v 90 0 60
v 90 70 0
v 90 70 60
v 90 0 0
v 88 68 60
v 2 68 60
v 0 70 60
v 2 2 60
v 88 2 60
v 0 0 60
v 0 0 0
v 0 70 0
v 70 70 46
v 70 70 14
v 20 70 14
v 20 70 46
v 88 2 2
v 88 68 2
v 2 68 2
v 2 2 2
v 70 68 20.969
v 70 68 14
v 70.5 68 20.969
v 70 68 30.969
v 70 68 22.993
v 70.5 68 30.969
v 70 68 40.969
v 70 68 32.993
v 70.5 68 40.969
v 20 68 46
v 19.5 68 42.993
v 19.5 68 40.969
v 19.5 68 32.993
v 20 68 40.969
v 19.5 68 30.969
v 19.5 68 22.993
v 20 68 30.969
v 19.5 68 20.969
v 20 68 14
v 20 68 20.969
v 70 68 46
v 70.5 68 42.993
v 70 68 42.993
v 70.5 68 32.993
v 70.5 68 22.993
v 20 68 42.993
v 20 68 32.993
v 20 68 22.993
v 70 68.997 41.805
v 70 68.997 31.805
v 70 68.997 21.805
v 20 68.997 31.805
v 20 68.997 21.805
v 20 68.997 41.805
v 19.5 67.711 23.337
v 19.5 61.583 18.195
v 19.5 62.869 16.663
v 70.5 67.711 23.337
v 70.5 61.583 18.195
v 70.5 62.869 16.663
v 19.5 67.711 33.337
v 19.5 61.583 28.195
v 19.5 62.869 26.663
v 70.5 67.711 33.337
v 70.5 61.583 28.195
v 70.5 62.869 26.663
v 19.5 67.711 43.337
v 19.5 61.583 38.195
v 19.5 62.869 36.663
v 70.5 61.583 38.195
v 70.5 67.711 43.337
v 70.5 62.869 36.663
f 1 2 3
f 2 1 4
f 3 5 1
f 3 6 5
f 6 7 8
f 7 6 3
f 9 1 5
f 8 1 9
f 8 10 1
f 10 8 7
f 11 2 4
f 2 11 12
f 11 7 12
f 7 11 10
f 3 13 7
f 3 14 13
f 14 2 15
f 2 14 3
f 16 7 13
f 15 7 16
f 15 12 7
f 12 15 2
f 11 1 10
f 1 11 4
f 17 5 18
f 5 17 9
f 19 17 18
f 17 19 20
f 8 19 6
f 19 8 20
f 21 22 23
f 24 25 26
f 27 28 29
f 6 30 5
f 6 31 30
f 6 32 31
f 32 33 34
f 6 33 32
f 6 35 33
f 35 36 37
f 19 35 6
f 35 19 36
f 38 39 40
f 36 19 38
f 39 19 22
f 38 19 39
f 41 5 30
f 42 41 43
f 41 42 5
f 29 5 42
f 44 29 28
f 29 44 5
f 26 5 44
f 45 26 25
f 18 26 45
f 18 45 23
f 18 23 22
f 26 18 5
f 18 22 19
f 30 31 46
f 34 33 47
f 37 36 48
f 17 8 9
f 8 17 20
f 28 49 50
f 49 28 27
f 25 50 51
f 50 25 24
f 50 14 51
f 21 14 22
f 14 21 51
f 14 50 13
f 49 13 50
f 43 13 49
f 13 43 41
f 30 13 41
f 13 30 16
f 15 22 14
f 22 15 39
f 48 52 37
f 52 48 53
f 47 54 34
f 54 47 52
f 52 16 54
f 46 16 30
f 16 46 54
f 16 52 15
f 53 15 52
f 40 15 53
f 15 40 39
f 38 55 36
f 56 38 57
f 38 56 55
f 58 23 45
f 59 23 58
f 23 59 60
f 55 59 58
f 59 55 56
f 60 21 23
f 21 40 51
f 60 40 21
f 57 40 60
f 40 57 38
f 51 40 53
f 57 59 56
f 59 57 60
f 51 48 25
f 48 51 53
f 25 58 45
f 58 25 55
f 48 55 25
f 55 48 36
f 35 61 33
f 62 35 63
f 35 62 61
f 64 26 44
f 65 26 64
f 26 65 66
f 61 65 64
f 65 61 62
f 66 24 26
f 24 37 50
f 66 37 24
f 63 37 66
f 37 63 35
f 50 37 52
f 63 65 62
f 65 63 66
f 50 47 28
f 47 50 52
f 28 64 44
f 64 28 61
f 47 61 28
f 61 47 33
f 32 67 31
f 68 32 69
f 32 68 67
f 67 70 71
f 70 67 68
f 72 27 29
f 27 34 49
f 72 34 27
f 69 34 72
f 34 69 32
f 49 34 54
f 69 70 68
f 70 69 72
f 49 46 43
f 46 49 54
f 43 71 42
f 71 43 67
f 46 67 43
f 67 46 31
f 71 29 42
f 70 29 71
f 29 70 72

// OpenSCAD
$fn = 32;

// ----------------------------------------------------------------------
// Vent box: louvers enclosure
// ----------------------------------------------------------------------

// --- parameters (mm) ---
box_l = 90;               // box length, X
box_w = 70;               // box width, Y
box_h = 60;               // box height, Z
wall_t = 2;               // shell wall thickness
win_l = 50;               // vent window width, X
win_h = 32;               // vent window height, Z
slat_t = 2;               // louver slat thickness
slat_d = 8;               // louver slat depth
slat_a = 40;              // louver slat angle, degrees
slat_pitch = 10;          // louver pitch
slat_yc = 65.29;          // slat centreline Y
fit_tol = 0.05;           // tolerance for press fits, mm
free_tol = 0.3;           // tolerance for clearance fits, mm

win_z0 = (box_h - win_h) / 2;  // window lower edge Z
n_slats = 3;  // louver count
slat_z0 = win_z0 + (win_h - (n_slats - 1) * slat_pitch) / 2;

difference() {
  union() {
    difference() {
      cube([box_l, box_w, box_h]);
  translate([wall_t, wall_t, wall_t])
    cube([box_l - 2 * wall_t, box_w - 2 * wall_t, box_h]);
  translate([(box_l - win_l) / 2, box_w - wall_t - 1, win_z0])
    cube([win_l, wall_t + 2, win_h]);
    }
    for (i = [0 : n_slats - 1])
      translate([box_l / 2, slat_yc, slat_z0 + i * slat_pitch])
        rotate([slat_a, 0, 0])
          cube([win_l + 1, slat_d, slat_t], center = true);
  }
}
